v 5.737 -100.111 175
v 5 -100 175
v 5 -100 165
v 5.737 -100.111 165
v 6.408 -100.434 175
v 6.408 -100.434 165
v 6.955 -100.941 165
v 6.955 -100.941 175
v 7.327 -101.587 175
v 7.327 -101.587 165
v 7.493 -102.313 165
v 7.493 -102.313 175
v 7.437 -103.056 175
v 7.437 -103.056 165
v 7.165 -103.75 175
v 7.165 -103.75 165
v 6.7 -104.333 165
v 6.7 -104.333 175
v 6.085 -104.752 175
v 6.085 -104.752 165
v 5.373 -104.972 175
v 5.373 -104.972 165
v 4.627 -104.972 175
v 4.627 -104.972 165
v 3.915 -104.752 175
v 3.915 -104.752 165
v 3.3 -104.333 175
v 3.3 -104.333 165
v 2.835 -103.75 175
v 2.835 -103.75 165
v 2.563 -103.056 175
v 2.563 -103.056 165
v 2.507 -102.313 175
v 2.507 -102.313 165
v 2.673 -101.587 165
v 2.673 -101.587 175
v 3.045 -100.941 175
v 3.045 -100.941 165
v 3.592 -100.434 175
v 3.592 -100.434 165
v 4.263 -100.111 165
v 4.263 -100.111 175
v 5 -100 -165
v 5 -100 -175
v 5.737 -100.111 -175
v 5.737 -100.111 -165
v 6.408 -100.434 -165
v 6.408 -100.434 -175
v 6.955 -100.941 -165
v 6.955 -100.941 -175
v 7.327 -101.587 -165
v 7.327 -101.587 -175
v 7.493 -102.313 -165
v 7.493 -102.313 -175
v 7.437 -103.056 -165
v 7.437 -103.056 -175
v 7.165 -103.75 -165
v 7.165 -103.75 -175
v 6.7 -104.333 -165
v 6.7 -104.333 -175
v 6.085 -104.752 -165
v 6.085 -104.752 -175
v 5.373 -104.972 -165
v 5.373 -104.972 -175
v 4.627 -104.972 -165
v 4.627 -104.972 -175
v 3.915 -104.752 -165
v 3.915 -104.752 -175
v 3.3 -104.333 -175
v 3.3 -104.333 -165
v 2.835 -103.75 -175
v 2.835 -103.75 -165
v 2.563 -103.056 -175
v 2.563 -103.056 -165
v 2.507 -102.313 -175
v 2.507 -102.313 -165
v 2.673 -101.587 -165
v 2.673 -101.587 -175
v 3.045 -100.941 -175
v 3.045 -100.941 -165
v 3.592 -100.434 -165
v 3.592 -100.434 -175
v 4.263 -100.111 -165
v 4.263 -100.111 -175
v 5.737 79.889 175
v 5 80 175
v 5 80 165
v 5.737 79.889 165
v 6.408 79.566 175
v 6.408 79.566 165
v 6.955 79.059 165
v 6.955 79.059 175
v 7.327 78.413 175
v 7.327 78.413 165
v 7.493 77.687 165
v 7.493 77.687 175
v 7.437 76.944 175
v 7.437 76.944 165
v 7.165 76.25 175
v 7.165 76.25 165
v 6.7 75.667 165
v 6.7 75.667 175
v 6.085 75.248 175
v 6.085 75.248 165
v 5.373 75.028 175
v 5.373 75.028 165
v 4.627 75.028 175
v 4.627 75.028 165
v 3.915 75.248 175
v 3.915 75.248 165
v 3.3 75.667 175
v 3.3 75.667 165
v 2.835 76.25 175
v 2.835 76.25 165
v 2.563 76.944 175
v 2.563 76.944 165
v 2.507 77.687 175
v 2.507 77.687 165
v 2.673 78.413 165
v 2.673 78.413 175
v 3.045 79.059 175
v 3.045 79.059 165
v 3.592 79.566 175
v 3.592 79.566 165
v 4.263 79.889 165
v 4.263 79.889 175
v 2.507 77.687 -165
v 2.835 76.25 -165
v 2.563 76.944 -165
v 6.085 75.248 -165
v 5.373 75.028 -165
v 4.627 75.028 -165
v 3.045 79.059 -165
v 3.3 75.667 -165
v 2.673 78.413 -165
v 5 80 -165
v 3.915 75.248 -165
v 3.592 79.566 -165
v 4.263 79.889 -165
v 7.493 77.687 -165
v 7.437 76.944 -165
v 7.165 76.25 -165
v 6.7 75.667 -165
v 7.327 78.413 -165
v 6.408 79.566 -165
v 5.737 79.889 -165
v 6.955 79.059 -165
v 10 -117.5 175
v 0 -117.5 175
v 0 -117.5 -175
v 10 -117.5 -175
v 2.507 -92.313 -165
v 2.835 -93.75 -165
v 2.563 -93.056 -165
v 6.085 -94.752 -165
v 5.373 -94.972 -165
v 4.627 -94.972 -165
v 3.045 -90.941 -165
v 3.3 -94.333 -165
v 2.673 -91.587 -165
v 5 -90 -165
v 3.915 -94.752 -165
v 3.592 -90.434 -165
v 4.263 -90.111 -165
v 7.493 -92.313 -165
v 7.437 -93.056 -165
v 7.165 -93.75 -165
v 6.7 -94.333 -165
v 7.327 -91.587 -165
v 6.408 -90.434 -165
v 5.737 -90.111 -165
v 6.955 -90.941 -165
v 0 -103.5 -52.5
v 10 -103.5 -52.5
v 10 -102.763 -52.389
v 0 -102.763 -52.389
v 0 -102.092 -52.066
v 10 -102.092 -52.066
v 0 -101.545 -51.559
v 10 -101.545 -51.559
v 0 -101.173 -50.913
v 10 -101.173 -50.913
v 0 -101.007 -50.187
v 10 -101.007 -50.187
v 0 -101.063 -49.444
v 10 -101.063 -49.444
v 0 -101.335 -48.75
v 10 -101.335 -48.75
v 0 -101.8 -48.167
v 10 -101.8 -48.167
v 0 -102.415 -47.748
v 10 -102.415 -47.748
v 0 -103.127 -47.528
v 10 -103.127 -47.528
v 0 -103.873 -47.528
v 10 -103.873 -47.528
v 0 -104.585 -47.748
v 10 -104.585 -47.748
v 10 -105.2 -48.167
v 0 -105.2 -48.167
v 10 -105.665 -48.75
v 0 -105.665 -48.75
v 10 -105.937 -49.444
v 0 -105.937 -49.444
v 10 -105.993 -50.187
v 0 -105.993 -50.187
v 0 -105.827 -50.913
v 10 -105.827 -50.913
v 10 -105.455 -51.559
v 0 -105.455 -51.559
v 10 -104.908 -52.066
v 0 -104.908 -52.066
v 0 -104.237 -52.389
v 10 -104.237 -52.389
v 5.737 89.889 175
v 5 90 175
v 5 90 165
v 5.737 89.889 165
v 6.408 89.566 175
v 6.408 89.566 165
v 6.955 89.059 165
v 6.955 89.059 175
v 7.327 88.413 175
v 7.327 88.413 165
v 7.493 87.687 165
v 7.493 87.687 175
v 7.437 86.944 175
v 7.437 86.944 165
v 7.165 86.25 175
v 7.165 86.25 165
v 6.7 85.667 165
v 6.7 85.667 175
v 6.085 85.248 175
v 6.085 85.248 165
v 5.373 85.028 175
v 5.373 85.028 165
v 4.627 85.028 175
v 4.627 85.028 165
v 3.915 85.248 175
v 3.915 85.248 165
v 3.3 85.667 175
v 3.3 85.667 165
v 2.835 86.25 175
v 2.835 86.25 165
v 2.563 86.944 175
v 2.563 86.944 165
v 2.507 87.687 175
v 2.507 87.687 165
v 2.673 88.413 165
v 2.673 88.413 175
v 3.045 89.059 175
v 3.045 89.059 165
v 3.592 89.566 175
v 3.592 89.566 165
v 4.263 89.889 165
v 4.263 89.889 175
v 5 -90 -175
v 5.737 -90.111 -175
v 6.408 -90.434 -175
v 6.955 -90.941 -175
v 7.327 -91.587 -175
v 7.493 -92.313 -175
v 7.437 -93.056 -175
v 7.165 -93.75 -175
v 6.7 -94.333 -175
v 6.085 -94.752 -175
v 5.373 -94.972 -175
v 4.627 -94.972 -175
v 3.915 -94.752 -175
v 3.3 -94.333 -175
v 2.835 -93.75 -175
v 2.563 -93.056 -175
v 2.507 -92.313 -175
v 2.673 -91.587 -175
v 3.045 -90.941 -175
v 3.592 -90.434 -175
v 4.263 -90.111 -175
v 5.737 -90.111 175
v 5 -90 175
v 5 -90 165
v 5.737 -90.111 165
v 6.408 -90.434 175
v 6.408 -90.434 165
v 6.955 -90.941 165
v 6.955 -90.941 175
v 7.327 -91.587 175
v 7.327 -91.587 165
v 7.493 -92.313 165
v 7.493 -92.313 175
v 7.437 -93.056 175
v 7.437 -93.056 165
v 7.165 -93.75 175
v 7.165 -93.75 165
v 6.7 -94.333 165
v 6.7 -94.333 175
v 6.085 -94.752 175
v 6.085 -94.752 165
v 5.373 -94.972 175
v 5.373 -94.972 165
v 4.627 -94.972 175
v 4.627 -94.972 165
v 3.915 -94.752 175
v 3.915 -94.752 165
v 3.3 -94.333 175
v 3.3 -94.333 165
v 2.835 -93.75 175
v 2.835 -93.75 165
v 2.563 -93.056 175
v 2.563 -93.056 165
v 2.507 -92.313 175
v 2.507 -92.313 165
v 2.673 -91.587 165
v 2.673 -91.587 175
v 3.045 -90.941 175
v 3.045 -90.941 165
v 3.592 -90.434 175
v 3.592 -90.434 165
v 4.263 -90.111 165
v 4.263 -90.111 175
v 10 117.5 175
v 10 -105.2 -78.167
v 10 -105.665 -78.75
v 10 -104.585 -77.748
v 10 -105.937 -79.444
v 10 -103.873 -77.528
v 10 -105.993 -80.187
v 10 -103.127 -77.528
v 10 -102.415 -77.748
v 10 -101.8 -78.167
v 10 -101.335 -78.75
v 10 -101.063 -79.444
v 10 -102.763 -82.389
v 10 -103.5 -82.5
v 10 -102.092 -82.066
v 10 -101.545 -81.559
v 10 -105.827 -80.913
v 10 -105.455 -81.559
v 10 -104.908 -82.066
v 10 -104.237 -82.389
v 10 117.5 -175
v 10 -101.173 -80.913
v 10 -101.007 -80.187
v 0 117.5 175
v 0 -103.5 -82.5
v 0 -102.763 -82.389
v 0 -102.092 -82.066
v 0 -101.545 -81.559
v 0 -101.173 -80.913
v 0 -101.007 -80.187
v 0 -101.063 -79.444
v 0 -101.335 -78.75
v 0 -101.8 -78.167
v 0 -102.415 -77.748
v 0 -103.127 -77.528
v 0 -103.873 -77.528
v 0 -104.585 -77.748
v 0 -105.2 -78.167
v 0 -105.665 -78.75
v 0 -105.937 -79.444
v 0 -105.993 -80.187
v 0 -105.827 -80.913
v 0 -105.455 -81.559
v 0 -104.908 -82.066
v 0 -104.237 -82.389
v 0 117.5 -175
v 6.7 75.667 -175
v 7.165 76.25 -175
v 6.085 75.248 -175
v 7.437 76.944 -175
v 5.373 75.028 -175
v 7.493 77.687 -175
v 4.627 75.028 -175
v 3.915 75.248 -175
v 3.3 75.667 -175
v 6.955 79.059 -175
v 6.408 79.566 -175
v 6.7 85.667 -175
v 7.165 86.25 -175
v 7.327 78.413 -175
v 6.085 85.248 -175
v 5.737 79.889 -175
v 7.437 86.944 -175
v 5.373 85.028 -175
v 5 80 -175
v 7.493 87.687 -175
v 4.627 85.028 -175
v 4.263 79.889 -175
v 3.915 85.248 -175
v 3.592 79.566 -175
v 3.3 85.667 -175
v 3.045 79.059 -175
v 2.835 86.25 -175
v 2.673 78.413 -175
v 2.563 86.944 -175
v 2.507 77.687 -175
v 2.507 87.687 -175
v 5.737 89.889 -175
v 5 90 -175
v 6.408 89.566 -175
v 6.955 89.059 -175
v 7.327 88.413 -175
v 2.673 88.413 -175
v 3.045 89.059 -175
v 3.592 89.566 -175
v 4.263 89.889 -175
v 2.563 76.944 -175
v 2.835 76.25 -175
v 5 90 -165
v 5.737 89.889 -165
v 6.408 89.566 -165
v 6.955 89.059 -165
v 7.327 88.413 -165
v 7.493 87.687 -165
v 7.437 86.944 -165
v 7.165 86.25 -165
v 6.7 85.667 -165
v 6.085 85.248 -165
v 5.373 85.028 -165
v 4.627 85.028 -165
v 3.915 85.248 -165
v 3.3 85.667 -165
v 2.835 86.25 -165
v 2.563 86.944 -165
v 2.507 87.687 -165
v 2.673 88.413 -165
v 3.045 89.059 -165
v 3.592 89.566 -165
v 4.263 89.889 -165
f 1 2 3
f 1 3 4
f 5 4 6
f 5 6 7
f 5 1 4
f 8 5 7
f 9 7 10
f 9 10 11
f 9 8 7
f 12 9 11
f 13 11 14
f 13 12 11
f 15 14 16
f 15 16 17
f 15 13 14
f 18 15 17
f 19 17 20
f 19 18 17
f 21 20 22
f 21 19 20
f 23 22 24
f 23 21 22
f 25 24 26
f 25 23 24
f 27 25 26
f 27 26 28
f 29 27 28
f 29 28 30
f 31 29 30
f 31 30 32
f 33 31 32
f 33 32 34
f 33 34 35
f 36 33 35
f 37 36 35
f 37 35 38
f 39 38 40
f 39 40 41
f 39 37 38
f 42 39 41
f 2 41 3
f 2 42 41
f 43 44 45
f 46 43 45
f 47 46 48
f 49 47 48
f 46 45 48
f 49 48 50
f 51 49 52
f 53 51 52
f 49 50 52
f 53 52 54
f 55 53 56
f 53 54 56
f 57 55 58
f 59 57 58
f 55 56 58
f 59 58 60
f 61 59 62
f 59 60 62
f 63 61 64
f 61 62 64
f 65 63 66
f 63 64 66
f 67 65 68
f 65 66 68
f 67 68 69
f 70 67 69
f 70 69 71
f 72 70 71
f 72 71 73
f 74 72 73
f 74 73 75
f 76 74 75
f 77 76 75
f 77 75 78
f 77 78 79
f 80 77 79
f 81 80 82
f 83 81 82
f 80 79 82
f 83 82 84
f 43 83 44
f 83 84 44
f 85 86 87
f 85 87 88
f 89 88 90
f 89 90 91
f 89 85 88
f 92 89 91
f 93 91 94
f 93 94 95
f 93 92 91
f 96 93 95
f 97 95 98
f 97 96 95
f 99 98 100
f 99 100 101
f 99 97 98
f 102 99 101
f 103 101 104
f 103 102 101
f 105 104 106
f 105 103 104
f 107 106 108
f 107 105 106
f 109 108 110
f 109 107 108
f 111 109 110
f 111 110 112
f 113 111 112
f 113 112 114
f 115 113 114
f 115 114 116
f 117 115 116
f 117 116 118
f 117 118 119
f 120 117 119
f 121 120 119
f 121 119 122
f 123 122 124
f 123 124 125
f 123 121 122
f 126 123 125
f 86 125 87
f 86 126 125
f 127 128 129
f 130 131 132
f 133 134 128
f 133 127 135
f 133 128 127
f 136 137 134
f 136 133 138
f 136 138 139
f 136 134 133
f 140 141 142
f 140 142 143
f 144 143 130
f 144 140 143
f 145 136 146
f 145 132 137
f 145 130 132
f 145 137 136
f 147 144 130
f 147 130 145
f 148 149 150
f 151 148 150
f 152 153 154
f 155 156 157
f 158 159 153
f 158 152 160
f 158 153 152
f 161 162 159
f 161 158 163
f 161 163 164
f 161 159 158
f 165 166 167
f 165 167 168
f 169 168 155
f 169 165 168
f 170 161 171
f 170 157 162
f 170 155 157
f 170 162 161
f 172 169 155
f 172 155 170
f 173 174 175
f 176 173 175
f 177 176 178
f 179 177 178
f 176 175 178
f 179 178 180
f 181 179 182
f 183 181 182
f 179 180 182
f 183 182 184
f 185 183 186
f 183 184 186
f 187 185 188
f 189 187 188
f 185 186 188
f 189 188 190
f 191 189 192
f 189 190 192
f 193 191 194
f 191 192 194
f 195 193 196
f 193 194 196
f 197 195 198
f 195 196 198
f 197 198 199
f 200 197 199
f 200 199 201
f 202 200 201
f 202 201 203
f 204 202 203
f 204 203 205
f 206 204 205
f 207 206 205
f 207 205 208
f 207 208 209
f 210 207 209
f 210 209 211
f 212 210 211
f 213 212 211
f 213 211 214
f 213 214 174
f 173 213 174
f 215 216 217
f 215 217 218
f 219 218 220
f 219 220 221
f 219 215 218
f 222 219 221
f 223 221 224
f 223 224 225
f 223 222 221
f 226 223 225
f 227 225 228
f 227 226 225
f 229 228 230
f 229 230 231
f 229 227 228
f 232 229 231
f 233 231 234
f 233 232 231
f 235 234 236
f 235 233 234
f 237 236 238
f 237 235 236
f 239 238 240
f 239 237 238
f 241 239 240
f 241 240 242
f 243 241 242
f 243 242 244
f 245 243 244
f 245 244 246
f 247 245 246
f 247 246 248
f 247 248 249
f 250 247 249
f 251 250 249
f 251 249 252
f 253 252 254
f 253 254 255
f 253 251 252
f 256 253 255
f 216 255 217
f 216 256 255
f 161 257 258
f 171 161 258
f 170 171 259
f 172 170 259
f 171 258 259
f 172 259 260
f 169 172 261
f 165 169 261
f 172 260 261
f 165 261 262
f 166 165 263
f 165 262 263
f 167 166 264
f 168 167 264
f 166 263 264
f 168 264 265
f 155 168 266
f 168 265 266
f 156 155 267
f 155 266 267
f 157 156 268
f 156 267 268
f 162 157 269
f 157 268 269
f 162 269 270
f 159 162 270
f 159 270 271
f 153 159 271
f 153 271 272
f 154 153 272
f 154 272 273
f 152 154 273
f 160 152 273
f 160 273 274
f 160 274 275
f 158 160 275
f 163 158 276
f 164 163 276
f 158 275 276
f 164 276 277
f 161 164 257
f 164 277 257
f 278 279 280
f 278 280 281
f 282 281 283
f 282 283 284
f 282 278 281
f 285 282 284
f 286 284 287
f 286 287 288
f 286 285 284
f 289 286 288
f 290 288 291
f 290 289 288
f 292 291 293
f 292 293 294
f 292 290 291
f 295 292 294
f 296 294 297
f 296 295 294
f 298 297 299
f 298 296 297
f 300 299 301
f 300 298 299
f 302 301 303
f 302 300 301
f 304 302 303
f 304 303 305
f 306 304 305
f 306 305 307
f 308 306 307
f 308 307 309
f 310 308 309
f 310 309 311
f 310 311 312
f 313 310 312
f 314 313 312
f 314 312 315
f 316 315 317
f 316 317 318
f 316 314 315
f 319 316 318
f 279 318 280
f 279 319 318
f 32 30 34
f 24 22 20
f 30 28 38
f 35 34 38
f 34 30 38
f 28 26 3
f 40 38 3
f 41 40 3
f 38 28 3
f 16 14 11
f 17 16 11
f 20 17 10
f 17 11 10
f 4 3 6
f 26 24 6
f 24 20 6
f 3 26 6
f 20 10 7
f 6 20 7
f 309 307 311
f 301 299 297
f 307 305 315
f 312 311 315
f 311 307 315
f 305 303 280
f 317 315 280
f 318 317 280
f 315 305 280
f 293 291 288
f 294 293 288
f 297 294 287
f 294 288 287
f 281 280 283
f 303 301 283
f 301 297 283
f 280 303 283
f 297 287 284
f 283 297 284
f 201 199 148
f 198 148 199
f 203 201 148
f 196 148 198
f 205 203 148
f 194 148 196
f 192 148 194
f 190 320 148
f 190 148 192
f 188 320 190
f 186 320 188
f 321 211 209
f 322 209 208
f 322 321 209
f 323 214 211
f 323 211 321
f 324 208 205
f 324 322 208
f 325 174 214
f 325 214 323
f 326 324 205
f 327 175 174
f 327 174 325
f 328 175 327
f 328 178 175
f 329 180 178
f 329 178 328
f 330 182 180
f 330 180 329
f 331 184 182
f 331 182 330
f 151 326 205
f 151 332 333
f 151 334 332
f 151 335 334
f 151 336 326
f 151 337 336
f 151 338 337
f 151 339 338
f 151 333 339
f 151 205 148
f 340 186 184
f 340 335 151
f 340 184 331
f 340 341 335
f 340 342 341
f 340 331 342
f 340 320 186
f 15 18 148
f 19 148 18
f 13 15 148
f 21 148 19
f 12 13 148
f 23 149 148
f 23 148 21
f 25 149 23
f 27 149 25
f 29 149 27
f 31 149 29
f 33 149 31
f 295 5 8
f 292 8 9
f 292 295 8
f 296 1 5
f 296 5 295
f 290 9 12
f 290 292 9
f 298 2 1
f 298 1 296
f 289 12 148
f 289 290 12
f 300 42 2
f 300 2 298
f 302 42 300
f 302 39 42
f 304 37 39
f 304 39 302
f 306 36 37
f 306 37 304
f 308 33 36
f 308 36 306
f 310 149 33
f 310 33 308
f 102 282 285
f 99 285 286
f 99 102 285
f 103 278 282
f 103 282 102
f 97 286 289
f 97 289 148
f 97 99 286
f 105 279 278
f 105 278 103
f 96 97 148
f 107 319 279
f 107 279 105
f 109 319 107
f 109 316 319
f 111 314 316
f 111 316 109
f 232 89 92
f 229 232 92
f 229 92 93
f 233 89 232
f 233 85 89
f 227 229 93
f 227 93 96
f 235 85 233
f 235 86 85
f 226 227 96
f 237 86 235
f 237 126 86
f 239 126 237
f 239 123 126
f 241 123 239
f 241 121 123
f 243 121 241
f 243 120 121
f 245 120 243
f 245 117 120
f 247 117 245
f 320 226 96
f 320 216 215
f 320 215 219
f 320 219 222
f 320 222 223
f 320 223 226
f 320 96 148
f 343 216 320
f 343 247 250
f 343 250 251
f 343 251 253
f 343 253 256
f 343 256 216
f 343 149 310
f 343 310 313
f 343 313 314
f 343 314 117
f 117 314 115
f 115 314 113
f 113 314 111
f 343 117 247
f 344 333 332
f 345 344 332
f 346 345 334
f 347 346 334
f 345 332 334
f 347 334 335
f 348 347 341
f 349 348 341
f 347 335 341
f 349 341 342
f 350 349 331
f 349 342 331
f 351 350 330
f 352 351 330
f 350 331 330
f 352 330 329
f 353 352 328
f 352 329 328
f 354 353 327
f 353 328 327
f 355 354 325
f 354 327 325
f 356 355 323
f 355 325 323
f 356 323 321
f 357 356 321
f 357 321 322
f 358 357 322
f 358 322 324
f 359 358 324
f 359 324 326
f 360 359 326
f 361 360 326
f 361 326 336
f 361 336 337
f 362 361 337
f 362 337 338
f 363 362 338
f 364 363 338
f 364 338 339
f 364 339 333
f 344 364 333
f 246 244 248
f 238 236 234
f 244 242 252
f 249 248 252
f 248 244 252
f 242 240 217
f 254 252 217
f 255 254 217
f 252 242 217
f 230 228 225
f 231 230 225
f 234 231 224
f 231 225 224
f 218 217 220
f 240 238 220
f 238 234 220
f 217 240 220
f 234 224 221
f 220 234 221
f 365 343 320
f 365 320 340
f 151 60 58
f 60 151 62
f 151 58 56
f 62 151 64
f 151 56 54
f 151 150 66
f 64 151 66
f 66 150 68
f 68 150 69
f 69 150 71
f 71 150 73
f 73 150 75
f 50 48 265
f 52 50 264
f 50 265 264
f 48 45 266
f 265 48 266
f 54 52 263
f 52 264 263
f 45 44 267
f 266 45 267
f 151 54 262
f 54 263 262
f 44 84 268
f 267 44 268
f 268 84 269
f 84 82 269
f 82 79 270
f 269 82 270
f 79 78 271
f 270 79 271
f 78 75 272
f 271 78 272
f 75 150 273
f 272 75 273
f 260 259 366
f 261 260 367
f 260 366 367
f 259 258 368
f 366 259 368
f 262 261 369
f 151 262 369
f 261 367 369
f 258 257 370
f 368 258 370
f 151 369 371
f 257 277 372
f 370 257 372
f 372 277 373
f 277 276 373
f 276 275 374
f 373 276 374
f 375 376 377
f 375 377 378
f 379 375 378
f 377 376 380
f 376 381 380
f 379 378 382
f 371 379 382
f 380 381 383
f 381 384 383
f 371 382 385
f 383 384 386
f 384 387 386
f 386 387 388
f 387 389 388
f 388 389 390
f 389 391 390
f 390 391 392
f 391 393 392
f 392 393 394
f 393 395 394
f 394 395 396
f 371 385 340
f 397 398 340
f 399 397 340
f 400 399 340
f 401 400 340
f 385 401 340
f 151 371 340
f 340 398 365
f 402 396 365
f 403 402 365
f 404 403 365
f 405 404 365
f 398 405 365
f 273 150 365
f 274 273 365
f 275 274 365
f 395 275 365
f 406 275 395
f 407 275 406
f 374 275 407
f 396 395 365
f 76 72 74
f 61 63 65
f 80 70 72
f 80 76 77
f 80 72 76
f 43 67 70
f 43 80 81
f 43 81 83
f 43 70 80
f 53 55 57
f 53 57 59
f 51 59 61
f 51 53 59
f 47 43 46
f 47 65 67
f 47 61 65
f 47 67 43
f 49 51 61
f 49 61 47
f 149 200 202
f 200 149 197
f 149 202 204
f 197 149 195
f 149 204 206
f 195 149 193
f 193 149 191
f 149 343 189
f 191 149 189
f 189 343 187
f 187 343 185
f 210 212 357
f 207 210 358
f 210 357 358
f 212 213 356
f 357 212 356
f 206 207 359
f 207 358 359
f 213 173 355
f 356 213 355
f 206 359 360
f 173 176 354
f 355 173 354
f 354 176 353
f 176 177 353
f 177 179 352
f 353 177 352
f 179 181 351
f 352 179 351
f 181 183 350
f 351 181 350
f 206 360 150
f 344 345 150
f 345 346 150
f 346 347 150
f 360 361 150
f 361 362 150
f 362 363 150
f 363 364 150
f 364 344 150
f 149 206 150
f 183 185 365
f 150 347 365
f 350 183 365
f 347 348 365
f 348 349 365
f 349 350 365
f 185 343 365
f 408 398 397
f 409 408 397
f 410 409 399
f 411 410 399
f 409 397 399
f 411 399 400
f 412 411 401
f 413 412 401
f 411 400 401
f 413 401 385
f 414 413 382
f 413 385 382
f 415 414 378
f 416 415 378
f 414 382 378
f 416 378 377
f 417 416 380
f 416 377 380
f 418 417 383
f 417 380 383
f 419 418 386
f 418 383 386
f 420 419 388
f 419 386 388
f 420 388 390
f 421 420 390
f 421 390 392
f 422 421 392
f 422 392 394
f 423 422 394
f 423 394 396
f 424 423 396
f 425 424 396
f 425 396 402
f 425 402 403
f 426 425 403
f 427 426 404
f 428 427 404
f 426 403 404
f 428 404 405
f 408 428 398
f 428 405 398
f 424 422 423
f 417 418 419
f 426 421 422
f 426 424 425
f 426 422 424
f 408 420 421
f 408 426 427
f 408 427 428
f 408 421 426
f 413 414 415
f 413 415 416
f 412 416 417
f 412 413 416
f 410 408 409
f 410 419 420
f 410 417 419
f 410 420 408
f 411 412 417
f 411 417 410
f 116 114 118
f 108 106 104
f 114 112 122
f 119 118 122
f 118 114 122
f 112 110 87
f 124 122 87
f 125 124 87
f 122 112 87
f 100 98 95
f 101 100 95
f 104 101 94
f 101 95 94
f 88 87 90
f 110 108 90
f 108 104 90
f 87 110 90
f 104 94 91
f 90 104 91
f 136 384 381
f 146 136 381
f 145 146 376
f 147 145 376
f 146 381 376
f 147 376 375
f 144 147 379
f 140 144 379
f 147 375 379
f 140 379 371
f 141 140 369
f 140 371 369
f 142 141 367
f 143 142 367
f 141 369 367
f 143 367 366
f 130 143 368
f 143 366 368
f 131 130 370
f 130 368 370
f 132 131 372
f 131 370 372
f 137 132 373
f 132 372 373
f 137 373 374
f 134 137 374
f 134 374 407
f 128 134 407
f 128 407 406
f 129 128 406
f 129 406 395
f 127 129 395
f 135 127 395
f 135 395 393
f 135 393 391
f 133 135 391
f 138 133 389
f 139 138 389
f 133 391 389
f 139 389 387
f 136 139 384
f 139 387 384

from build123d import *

# Parameters (mm, degrees)
SKETCH1_W           = 350
SKETCH1_H           = 235
BOSS_EXTRUDE1_DEPTH = 10
SKETCH2_R           = 2.5
CUT_EXTRUDE1_DEPTH  = 212.024287702
SKETCH3_R           = 2.5
CUT_EXTRUDE2_DEPTH  = 10


with BuildPart() as part:
    # Sketch1 → Boss-Extrude1 (new body)
    with BuildSketch(Plane(origin=(0, 0, 0), x_dir=(0, 0, -1), z_dir=(1, 0, 0))):
        Rectangle(SKETCH1_W, SKETCH1_H)
    extrude(amount=BOSS_EXTRUDE1_DEPTH)

    # Sketch2 → Cut-Extrude1 (cut, through all)
    with BuildSketch(Plane(origin=(10, 0, 0), x_dir=(0, 0, -1), z_dir=(1, 0, 0))):
        with Locations((50, -103.5)):
            Circle(SKETCH2_R)
        with Locations((80, -103.5)):
            Circle(SKETCH2_R)
    extrude(amount=-CUT_EXTRUDE1_DEPTH, mode=Mode.SUBTRACT)

    # Sketch3 → Cut-Extrude2 (cut)
    with BuildSketch(Plane(origin=(0, 0, -175), x_dir=(-1, 0, 0), z_dir=(0, 0, -1))):
        with Locations(Location((-5, 87.5, 0), (0, 0, 90))):
            Circle(SKETCH3_R)
        with Locations(Location((-5, 77.5, 0), (0, 0, 90))):
            Circle(SKETCH3_R)
        with Locations(Location((-5, -92.5, 0), (0, 0, 90))):
            Circle(SKETCH3_R)
        with Locations(Location((-5, -102.5, 0), (0, 0, 90))):
            Circle(SKETCH3_R)
    cut_extrude2 = extrude(amount=-CUT_EXTRUDE2_DEPTH, mode=Mode.SUBTRACT)

    # Mirror1: Cut-Extrude2 across plane
    add(cut_extrude2.mirror(Plane.XY), mode=Mode.SUBTRACT)


solid = part.part
